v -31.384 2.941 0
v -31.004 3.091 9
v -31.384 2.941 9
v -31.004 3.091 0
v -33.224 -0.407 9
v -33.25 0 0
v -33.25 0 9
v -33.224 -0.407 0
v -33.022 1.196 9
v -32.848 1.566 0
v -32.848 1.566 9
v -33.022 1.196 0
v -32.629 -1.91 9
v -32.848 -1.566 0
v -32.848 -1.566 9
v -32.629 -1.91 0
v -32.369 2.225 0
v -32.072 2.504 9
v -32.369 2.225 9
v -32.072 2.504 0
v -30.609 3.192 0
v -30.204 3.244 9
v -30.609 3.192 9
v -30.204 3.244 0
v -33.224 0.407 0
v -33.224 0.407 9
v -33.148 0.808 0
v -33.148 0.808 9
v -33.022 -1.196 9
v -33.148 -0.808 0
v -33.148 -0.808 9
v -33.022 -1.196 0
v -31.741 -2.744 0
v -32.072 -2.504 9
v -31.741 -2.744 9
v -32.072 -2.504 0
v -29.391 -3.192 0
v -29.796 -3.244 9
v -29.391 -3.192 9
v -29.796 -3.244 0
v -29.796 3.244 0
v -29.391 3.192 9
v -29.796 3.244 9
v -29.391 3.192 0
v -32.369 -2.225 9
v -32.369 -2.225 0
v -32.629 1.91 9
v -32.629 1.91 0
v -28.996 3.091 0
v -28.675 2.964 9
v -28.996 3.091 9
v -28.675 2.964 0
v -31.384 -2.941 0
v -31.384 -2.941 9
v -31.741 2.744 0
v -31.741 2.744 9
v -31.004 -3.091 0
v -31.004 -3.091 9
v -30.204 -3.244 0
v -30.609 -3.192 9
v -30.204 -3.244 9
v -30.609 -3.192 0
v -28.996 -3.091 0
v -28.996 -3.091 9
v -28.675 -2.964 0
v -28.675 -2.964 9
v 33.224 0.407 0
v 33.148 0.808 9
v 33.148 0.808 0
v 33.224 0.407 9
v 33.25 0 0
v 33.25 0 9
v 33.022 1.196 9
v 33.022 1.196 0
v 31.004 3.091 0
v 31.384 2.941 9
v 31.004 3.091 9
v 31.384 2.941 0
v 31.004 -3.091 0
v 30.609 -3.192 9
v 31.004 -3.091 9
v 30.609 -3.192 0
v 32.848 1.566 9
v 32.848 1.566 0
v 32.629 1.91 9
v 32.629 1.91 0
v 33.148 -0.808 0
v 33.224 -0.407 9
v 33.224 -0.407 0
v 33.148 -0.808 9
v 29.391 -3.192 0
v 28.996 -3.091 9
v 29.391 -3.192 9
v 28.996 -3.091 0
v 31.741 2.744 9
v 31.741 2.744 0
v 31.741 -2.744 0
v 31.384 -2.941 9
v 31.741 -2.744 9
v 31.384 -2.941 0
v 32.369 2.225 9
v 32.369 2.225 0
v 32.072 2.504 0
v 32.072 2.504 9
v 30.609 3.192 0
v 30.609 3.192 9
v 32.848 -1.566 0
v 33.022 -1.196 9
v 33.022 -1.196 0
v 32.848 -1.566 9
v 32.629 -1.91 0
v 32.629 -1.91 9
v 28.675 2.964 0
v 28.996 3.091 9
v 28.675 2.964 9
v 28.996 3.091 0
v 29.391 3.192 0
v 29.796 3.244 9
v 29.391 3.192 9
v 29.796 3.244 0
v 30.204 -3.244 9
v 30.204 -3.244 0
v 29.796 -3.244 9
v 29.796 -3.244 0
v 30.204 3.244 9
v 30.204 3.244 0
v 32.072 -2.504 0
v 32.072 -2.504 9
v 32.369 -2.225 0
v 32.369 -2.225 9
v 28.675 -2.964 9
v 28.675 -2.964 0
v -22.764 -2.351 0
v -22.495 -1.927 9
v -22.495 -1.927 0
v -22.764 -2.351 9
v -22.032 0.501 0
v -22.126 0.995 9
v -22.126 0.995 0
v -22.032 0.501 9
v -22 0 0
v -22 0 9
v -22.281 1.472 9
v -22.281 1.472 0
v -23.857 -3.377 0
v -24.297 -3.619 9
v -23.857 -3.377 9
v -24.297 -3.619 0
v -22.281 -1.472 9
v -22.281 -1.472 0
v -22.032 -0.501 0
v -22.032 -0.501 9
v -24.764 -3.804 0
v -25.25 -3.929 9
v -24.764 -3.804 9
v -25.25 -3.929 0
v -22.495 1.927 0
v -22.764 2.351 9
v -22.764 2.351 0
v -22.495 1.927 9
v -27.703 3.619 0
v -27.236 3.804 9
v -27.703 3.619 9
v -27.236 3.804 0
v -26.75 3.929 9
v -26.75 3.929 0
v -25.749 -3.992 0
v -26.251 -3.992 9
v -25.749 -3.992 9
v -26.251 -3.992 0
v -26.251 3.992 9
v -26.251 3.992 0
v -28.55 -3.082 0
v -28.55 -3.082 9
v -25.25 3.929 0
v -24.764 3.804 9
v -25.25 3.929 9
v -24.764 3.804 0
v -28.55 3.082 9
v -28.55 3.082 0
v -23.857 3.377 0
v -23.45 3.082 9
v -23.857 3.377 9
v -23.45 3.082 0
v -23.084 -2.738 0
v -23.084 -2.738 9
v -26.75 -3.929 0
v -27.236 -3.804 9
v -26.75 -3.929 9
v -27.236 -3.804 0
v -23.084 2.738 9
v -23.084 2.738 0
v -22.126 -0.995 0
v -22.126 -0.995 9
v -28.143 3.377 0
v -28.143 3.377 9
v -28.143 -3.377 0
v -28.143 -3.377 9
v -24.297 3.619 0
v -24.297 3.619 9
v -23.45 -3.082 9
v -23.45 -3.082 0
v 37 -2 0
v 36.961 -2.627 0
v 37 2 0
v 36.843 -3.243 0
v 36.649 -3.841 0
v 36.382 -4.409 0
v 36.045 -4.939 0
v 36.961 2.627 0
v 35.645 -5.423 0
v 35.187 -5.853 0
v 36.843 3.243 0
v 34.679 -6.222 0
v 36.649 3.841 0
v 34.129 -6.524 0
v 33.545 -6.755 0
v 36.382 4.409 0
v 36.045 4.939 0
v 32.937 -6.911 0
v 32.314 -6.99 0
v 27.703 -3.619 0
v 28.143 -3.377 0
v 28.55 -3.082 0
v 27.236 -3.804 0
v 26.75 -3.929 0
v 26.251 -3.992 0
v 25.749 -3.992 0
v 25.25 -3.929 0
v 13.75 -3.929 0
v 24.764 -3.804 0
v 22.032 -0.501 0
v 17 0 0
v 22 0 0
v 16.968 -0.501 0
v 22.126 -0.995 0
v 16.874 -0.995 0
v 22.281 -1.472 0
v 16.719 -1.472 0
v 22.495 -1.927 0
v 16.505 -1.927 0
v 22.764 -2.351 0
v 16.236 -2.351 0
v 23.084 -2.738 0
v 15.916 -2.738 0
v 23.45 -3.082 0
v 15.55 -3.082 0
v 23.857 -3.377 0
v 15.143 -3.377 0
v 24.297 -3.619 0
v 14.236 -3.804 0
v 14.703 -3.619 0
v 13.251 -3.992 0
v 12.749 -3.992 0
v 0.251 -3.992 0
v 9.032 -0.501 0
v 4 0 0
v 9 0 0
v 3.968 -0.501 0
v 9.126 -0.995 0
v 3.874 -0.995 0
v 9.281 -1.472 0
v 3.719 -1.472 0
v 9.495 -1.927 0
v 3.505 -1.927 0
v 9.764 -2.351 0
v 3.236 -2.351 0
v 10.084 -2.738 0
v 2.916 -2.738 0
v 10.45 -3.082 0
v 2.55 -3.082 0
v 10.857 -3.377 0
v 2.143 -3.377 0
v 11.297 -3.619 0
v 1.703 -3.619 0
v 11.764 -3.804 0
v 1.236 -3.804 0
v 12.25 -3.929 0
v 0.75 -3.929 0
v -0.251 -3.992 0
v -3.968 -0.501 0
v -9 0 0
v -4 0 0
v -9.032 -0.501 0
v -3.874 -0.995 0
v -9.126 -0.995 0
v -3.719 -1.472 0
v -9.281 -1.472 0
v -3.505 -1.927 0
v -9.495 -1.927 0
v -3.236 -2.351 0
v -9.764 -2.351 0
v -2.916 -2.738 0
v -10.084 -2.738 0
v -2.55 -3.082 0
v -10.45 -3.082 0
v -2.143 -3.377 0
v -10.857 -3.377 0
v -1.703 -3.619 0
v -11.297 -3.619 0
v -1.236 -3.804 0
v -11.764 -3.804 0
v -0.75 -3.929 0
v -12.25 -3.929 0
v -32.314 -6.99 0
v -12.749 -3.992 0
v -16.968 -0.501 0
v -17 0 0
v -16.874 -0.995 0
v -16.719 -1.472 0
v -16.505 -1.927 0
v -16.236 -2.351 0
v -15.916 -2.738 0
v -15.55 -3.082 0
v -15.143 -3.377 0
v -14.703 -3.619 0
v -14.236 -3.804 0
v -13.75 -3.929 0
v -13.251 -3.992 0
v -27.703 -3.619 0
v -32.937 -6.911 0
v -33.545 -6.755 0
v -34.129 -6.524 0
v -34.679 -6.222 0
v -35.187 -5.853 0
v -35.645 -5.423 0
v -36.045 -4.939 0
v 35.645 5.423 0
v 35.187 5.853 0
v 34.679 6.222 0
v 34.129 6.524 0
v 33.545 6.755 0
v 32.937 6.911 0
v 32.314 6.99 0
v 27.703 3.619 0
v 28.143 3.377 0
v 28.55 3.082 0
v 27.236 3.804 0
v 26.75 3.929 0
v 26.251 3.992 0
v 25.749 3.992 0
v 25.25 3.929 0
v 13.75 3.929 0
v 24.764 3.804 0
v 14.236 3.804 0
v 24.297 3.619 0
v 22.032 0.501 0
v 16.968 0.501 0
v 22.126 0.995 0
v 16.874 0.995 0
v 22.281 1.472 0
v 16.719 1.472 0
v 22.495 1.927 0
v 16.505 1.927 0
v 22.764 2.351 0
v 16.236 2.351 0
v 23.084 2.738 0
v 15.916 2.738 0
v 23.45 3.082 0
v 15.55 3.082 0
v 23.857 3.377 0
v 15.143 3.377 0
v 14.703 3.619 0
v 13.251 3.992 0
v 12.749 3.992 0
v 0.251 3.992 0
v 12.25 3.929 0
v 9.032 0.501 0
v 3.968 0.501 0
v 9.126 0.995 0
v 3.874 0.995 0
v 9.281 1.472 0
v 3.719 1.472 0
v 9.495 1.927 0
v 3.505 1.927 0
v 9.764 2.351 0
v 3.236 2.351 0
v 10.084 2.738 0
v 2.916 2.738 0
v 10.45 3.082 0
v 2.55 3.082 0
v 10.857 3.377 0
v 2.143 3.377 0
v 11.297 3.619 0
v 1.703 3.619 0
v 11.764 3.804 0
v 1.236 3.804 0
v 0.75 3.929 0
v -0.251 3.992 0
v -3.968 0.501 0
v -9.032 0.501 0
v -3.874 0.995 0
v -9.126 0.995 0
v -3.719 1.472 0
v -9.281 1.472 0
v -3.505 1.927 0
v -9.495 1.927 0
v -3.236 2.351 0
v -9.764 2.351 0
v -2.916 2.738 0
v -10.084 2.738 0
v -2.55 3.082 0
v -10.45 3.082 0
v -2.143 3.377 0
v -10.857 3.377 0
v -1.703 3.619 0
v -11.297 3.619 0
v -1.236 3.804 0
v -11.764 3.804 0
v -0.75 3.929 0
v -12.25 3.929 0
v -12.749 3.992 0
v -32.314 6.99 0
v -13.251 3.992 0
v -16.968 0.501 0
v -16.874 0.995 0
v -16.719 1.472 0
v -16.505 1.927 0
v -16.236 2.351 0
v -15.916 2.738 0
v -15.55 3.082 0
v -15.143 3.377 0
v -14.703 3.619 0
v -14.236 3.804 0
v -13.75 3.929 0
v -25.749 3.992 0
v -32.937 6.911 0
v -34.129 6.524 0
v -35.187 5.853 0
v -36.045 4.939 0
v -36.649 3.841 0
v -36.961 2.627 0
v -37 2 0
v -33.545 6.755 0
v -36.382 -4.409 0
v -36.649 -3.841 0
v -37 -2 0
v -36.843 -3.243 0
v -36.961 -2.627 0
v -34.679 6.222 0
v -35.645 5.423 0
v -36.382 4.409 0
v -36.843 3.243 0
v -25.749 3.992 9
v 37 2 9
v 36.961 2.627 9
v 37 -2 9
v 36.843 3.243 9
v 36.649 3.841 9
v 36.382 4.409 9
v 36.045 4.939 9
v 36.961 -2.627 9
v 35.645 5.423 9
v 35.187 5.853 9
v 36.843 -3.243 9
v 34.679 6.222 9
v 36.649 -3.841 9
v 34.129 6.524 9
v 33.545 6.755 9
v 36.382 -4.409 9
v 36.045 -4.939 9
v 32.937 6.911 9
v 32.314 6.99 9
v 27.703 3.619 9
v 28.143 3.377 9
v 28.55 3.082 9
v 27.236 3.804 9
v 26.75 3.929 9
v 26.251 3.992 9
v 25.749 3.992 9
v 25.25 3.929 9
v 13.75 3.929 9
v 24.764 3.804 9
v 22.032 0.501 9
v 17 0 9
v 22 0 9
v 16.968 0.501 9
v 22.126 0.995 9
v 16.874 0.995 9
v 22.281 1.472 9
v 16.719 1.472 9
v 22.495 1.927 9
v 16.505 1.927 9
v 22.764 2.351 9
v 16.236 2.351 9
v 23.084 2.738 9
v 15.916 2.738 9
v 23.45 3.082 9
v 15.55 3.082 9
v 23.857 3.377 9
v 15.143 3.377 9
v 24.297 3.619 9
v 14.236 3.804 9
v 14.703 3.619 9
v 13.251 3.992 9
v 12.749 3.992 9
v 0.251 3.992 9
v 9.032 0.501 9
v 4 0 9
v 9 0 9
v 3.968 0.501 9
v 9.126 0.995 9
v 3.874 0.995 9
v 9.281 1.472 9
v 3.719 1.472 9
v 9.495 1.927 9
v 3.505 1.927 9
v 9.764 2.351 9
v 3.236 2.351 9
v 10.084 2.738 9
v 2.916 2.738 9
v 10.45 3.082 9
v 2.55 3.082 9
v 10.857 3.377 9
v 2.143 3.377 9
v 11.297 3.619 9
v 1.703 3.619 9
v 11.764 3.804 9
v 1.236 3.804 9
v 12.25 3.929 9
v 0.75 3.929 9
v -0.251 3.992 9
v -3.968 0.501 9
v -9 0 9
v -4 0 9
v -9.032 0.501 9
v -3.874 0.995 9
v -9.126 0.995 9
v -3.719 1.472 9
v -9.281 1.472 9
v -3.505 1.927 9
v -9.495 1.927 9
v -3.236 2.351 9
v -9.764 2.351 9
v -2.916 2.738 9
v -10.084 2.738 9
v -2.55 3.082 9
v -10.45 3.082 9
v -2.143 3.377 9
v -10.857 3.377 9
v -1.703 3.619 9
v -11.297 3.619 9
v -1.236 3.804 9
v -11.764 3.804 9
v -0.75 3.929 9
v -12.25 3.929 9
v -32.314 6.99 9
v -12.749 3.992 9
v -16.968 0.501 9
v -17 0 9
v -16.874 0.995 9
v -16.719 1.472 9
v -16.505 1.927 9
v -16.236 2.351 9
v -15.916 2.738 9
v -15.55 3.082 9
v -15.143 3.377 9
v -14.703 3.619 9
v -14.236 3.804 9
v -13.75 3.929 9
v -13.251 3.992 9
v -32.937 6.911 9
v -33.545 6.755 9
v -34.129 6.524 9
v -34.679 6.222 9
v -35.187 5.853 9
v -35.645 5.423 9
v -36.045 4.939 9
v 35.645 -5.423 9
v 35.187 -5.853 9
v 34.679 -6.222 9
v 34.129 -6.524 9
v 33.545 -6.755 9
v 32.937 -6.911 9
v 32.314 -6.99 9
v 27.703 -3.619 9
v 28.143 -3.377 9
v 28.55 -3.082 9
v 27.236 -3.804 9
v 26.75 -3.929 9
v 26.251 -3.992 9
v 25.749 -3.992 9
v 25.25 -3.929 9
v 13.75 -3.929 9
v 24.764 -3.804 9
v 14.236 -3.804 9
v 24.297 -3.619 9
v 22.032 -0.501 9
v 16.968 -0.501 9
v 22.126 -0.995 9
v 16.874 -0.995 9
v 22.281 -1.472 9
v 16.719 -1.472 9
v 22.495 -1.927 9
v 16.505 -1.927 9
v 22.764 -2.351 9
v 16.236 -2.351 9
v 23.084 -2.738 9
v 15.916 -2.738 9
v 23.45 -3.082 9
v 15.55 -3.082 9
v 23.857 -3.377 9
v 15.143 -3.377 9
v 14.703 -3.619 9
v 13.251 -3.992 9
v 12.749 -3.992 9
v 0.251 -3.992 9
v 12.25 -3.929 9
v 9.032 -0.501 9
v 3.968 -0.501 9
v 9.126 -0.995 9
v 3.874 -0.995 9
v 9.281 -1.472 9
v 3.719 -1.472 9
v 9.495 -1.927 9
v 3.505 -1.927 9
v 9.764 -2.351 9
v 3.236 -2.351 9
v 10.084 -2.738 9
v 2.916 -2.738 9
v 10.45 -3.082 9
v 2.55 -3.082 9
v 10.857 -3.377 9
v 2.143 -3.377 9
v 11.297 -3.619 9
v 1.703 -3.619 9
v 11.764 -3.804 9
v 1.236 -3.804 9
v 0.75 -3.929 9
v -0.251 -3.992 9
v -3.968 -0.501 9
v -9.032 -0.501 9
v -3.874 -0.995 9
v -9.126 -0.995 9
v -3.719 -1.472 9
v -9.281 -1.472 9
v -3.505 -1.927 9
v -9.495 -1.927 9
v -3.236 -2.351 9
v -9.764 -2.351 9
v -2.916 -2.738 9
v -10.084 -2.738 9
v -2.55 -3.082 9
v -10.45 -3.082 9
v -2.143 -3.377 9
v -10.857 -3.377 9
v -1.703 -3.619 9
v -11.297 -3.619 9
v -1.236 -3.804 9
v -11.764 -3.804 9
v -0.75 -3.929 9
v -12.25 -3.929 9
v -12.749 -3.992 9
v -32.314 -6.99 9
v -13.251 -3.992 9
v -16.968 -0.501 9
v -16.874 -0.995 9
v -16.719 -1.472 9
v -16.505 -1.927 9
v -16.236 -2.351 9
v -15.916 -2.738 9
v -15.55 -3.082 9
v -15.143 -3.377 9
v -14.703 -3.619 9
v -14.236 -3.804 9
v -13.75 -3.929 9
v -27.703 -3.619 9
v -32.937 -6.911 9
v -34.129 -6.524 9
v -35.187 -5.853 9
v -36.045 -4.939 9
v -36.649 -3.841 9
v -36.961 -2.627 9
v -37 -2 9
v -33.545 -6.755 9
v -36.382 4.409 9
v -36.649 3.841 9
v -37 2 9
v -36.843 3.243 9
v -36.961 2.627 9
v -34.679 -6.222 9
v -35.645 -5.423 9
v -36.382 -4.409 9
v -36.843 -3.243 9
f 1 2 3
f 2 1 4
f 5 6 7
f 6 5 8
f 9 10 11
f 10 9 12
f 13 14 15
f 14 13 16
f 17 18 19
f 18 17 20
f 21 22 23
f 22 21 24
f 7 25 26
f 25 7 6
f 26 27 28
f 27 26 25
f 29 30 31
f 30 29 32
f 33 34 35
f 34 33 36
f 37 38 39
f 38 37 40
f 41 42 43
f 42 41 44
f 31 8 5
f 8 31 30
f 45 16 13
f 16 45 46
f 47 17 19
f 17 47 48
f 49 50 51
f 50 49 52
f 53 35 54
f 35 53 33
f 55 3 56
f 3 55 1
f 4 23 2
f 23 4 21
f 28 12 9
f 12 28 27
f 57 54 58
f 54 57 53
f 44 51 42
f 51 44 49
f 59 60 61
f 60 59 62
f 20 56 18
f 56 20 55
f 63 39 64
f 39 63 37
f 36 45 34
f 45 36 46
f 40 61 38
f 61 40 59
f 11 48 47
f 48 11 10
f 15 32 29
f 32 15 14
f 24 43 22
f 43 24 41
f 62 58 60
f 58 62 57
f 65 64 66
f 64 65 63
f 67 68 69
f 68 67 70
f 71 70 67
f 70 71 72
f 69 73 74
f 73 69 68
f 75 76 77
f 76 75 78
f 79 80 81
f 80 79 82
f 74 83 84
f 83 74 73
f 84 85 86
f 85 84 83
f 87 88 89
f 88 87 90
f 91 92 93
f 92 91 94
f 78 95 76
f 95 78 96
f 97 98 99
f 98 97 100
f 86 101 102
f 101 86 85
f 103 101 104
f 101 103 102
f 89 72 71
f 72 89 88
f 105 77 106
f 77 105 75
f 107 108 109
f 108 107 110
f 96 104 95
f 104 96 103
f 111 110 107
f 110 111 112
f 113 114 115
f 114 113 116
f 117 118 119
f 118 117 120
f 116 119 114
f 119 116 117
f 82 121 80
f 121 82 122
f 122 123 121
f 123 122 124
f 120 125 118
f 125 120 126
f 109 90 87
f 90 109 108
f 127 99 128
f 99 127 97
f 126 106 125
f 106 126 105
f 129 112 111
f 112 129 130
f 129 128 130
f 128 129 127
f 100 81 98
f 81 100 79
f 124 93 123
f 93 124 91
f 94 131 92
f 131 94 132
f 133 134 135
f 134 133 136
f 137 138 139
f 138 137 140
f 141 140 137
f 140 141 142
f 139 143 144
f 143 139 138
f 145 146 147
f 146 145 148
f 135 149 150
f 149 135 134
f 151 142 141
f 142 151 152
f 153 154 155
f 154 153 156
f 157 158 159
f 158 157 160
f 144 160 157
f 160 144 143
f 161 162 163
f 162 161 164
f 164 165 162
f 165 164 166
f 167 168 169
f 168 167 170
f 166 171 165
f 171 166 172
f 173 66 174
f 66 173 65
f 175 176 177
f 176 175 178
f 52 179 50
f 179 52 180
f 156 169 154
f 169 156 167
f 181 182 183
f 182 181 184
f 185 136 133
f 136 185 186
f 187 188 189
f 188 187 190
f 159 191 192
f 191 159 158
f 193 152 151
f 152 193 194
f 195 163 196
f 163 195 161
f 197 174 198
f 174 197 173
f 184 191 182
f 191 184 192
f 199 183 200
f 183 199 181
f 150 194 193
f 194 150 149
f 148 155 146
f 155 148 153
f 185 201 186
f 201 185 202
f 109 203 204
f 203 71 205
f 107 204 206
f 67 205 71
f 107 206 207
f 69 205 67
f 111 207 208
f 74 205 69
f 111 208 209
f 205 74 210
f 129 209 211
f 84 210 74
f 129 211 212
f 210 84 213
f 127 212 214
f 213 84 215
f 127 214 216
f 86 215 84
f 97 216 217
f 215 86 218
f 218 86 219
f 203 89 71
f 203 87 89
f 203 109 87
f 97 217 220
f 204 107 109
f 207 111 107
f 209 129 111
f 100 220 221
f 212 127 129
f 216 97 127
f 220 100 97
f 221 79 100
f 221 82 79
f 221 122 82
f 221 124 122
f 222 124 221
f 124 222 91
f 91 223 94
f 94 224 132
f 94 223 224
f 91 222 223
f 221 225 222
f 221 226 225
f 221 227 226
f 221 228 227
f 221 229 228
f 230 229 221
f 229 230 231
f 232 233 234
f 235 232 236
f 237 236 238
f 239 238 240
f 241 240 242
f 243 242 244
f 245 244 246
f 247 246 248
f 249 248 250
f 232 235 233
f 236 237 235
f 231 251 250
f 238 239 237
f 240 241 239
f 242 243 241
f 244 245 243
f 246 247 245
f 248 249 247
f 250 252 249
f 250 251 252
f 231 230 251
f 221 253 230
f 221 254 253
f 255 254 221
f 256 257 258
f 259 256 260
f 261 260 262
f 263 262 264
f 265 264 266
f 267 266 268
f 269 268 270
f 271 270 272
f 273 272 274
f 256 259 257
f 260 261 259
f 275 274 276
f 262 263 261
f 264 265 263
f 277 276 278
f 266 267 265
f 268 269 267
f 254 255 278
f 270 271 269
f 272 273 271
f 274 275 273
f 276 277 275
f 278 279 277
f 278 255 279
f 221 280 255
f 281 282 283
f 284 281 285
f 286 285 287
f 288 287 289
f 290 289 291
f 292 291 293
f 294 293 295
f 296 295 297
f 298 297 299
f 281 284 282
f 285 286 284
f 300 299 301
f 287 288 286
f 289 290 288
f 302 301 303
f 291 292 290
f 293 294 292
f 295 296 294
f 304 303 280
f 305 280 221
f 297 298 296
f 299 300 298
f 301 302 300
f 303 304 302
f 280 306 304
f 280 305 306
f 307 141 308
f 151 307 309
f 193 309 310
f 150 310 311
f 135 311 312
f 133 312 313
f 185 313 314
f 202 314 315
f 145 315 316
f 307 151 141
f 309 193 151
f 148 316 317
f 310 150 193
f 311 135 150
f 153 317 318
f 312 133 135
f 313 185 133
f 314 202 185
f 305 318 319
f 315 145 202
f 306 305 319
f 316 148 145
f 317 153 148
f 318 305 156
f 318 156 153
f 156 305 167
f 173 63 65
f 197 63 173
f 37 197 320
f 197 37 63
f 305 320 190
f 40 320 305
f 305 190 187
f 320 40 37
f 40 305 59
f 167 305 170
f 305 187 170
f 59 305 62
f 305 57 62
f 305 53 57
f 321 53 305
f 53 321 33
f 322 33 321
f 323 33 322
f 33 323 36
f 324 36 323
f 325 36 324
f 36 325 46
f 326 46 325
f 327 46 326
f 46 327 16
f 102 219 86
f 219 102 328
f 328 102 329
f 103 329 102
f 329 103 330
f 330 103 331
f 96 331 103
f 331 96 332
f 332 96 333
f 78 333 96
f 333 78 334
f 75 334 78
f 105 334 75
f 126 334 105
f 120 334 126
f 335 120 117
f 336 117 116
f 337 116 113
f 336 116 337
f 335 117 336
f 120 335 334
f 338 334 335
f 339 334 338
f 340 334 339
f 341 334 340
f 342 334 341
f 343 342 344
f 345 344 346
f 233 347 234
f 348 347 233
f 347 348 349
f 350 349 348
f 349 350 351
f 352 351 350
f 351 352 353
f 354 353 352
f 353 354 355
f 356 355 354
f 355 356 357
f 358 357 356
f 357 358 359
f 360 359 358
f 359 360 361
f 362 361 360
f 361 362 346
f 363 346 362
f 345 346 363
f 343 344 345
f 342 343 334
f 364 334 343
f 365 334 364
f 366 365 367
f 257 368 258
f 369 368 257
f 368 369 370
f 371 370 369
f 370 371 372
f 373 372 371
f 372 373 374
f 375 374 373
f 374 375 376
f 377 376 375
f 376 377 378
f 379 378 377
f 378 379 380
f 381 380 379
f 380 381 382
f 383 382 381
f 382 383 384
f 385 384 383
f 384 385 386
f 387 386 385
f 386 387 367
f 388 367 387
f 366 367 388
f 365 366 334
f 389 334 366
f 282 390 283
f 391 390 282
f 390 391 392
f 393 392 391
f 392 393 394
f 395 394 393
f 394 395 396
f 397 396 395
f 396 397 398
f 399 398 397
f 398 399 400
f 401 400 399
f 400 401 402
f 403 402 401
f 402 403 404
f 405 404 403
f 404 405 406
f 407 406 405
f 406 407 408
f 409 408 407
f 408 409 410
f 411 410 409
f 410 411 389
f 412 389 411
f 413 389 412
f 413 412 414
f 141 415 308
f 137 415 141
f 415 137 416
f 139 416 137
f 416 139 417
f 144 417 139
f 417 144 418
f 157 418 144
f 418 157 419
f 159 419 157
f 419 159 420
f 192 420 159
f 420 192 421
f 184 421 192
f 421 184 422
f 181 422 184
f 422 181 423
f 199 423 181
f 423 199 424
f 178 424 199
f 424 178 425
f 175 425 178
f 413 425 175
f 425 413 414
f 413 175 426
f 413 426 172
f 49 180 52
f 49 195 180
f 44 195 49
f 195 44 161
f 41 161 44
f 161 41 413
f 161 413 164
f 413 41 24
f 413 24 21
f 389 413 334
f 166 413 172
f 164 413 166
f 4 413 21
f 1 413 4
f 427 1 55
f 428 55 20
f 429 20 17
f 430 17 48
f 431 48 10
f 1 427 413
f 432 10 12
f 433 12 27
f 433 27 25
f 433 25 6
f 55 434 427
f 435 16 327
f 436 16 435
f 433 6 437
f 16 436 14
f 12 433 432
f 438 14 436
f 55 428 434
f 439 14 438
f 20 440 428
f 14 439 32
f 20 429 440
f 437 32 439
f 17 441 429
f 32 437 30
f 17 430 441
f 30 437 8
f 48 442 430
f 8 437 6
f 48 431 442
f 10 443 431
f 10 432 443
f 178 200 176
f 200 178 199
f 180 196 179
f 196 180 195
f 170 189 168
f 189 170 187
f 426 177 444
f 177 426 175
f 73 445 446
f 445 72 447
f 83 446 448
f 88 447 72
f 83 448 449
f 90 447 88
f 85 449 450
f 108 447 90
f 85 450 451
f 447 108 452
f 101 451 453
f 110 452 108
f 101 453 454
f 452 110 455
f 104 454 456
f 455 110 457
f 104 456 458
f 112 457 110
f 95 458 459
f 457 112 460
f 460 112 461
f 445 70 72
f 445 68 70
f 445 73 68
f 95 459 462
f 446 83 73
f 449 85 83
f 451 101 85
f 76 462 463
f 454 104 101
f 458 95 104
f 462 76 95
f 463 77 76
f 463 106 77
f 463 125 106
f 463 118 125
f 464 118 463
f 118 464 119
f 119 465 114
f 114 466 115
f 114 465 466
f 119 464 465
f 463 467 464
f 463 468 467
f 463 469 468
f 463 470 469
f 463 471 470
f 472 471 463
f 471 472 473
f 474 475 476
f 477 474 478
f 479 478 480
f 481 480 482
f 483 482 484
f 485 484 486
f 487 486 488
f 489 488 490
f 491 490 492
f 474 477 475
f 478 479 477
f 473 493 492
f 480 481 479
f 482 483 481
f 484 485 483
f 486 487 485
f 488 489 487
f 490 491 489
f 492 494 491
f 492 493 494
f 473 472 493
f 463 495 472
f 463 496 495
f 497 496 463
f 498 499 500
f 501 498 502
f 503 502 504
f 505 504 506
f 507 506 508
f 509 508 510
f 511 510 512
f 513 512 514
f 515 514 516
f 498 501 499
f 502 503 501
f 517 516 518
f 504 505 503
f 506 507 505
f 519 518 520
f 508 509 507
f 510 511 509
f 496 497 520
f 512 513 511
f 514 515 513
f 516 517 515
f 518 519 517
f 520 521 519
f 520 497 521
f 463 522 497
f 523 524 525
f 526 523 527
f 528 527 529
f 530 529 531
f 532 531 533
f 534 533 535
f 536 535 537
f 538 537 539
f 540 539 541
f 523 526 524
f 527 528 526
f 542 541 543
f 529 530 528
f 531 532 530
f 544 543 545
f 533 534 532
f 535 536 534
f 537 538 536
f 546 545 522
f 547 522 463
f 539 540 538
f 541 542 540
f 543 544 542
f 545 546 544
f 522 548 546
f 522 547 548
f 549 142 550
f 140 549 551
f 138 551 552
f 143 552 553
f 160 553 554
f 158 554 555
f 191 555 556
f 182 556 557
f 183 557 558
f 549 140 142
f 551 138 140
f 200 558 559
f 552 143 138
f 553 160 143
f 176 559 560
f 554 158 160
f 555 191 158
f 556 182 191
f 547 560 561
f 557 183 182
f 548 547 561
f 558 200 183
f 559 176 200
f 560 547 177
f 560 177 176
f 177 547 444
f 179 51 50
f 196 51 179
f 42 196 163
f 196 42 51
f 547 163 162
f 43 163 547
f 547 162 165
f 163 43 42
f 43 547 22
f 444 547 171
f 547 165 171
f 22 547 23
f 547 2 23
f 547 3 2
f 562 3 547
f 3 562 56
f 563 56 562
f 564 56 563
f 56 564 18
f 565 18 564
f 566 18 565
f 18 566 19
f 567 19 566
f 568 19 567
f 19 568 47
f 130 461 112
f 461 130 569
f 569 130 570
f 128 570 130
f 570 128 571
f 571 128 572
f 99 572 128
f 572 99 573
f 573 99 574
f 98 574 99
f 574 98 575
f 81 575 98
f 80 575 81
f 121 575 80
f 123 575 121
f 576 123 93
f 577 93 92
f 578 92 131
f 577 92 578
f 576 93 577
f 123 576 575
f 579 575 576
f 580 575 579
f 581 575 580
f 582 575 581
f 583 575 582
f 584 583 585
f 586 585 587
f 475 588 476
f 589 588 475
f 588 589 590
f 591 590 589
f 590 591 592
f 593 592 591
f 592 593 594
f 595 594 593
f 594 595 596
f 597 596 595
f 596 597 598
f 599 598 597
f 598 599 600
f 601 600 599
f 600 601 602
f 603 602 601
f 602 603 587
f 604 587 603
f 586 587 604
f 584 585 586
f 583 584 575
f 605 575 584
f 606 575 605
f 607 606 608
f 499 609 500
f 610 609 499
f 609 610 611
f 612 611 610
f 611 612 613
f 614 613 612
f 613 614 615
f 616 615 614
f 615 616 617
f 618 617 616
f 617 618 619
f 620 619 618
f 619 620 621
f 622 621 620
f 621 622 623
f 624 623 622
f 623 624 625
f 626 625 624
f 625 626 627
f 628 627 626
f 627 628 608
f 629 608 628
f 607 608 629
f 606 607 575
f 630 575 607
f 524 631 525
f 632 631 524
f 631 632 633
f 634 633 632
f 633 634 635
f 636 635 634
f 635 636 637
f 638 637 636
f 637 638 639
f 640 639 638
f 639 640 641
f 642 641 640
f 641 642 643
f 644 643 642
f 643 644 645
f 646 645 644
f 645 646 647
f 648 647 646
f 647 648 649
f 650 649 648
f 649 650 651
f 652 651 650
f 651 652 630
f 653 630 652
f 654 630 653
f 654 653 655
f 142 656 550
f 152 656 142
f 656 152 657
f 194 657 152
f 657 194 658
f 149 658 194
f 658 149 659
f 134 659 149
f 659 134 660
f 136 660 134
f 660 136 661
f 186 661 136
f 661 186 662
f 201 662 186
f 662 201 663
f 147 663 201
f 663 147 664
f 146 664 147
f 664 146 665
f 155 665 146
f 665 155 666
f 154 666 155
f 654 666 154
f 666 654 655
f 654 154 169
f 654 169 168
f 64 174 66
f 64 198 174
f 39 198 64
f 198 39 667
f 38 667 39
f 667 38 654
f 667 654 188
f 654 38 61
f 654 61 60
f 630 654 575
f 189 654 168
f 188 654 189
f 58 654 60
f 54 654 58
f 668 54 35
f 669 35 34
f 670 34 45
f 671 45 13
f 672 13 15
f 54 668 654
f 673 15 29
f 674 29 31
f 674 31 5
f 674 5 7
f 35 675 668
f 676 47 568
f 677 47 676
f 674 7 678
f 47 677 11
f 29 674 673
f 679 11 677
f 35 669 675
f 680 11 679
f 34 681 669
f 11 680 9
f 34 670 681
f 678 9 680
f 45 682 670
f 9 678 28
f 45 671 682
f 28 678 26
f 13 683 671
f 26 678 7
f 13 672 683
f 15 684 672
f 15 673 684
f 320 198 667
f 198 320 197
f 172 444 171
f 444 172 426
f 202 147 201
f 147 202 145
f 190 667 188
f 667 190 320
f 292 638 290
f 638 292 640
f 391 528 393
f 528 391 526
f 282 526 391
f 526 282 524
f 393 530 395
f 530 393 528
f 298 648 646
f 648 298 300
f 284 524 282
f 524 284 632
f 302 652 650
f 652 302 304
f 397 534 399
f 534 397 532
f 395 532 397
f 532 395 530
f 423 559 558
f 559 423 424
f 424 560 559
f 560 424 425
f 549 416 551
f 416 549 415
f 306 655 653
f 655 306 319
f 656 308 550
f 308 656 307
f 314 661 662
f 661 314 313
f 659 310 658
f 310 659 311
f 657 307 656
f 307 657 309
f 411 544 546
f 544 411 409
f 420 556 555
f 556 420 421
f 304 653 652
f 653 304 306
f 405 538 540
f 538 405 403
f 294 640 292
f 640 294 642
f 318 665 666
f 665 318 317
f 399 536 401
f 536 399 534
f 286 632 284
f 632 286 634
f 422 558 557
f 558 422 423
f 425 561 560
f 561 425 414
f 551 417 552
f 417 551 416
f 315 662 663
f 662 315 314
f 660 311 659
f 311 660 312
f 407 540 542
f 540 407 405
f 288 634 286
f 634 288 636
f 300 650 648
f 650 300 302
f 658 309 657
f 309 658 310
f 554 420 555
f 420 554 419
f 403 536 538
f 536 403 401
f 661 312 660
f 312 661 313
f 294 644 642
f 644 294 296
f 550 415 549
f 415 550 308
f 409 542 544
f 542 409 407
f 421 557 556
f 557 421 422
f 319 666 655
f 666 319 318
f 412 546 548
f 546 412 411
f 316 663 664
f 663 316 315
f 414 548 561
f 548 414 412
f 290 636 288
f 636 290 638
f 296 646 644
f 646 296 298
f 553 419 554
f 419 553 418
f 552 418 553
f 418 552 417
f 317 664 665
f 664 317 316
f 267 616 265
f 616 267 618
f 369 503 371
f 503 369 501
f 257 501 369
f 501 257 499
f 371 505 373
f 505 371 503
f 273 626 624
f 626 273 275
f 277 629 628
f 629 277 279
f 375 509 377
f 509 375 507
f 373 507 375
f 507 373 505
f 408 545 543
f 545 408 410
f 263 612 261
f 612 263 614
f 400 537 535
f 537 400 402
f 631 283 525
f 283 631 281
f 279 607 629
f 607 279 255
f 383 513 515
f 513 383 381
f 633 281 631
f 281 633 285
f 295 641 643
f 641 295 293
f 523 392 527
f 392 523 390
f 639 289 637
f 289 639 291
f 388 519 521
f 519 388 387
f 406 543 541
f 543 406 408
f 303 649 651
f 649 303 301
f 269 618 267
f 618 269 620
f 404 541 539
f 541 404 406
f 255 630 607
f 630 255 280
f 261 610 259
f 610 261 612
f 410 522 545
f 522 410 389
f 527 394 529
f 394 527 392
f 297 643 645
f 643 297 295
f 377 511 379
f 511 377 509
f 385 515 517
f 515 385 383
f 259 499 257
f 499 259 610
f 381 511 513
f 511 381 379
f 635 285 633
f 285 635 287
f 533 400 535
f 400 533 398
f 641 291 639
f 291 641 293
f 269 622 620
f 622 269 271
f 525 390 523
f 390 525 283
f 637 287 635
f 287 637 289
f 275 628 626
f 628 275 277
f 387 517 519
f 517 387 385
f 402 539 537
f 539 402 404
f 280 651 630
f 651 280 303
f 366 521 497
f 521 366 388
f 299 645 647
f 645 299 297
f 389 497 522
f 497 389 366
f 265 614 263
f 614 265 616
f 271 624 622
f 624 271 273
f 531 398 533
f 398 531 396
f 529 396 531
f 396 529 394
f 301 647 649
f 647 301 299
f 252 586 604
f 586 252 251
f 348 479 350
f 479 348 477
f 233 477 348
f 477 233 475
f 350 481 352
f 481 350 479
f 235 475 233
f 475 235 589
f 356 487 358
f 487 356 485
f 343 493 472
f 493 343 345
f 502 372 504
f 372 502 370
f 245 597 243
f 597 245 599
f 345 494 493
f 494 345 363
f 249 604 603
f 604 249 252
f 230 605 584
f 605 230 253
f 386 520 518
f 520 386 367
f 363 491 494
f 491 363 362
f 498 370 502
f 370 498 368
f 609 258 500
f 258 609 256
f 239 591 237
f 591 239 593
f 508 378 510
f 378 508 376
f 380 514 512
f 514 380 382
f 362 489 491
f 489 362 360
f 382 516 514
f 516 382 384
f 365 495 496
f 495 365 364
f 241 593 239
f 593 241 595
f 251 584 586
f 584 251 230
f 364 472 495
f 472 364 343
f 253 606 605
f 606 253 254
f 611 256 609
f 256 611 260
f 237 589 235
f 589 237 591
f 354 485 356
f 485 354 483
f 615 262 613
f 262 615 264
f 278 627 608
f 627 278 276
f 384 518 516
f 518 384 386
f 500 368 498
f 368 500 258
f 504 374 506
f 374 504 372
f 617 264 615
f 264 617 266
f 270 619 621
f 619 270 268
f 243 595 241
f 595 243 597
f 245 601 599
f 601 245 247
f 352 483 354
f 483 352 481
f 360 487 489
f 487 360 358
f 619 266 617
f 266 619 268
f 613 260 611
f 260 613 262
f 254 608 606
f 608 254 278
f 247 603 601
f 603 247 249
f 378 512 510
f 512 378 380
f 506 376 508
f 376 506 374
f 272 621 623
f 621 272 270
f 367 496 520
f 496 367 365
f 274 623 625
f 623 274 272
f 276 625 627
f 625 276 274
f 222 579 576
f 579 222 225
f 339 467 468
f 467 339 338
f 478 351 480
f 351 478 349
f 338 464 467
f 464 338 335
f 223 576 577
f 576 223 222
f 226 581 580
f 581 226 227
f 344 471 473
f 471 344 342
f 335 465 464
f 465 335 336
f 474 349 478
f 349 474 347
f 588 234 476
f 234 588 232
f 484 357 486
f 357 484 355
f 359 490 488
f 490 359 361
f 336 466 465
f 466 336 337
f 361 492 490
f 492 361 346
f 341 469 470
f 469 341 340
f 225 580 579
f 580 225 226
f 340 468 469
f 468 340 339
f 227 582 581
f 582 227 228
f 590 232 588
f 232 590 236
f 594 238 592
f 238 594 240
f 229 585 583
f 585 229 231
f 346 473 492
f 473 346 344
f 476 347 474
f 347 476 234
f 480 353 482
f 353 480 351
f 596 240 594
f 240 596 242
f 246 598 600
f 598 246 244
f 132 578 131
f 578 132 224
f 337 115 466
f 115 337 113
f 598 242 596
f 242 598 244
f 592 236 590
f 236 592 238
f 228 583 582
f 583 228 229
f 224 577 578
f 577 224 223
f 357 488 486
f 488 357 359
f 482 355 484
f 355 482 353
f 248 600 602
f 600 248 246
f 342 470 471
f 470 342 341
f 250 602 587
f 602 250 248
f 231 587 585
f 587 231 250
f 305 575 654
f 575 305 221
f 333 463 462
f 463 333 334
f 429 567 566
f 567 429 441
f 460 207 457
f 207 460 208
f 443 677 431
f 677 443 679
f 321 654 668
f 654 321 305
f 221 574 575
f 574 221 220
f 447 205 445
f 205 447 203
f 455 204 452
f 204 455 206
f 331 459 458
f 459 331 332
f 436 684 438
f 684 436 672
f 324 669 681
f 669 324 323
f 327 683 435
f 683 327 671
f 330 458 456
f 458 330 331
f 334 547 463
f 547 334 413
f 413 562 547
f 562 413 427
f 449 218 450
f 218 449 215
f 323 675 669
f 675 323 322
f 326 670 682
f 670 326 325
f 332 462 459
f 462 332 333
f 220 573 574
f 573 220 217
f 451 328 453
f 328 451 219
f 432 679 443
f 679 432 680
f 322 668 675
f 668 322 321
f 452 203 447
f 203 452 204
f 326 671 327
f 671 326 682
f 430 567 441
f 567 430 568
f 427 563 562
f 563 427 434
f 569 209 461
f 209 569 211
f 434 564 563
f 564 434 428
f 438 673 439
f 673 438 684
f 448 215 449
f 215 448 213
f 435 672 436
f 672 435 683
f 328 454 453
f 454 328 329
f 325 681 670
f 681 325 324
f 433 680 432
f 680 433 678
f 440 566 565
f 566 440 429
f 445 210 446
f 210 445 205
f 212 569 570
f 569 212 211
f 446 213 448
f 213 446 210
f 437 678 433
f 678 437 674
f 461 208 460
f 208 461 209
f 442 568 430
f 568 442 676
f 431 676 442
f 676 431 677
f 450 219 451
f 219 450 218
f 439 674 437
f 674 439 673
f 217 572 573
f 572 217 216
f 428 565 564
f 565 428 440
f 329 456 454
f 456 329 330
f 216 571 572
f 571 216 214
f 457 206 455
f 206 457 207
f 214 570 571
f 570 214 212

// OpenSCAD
$fn = 50;


difference() {
	union() {
		hull() {
			translate(v = [-32.0000000000, 2.0000000000, 0]) {
				cylinder(h = 9, r = 5);
			}
			translate(v = [32.0000000000, 2.0000000000, 0]) {
				cylinder(h = 9, r = 5);
			}
			translate(v = [-32.0000000000, -2.0000000000, 0]) {
				cylinder(h = 9, r = 5);
			}
			translate(v = [32.0000000000, -2.0000000000, 0]) {
				cylinder(h = 9, r = 5);
			}
		}
	}
	union() {
		#translate(v = [-30.0000000000, 0.0000000000, -100.0000000000]) {
			cylinder(h = 200, r = 3.2500000000);
		}
		#translate(v = [-30.0000000000, 0.0000000000, -100.0000000000]) {
			cylinder(h = 200, r = 3.2500000000);
		}
		#translate(v = [30.0000000000, 0.0000000000, -100.0000000000]) {
			cylinder(h = 200, r = 3.2500000000);
		}
		#translate(v = [30.0000000000, 0.0000000000, -100.0000000000]) {
			cylinder(h = 200, r = 3.2500000000);
		}
		#translate(v = [-26.0000000000, 0, 0]) {
			cylinder(h = 9, r = 4.0000000000);
		}
		#translate(v = [-13.0000000000, 0, 0]) {
			cylinder(h = 9, r = 4.0000000000);
		}
		#cylinder(h = 9, r = 4.0000000000);
		#translate(v = [13.0000000000, 0, 0]) {
			cylinder(h = 9, r = 4.0000000000);
		}
		#translate(v = [26.0000000000, 0, 0]) {
			cylinder(h = 9, r = 4.0000000000);
		}
	}
}
